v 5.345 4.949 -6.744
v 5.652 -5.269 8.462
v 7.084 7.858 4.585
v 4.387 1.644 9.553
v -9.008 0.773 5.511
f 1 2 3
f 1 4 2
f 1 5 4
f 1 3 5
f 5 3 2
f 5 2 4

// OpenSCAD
polyhedron(points=[[7.0841400373684635, 7.858042265625446, 4.584699349013084], [5.652443012552311, -5.268756263227958, 8.461506170911996], [4.38685472643119, 1.644391519074194, 9.552902938837992], [-9.00793398215248, 0.7733509258770432, 5.511059628639899], [5.345165929164654, 4.949167866470283, -6.744482756912065]], faces=[[0, 1, 4], [1, 2, 4], [2, 3, 4], [3, 0, 4], [1, 0, 3], [2, 1, 3]]);
